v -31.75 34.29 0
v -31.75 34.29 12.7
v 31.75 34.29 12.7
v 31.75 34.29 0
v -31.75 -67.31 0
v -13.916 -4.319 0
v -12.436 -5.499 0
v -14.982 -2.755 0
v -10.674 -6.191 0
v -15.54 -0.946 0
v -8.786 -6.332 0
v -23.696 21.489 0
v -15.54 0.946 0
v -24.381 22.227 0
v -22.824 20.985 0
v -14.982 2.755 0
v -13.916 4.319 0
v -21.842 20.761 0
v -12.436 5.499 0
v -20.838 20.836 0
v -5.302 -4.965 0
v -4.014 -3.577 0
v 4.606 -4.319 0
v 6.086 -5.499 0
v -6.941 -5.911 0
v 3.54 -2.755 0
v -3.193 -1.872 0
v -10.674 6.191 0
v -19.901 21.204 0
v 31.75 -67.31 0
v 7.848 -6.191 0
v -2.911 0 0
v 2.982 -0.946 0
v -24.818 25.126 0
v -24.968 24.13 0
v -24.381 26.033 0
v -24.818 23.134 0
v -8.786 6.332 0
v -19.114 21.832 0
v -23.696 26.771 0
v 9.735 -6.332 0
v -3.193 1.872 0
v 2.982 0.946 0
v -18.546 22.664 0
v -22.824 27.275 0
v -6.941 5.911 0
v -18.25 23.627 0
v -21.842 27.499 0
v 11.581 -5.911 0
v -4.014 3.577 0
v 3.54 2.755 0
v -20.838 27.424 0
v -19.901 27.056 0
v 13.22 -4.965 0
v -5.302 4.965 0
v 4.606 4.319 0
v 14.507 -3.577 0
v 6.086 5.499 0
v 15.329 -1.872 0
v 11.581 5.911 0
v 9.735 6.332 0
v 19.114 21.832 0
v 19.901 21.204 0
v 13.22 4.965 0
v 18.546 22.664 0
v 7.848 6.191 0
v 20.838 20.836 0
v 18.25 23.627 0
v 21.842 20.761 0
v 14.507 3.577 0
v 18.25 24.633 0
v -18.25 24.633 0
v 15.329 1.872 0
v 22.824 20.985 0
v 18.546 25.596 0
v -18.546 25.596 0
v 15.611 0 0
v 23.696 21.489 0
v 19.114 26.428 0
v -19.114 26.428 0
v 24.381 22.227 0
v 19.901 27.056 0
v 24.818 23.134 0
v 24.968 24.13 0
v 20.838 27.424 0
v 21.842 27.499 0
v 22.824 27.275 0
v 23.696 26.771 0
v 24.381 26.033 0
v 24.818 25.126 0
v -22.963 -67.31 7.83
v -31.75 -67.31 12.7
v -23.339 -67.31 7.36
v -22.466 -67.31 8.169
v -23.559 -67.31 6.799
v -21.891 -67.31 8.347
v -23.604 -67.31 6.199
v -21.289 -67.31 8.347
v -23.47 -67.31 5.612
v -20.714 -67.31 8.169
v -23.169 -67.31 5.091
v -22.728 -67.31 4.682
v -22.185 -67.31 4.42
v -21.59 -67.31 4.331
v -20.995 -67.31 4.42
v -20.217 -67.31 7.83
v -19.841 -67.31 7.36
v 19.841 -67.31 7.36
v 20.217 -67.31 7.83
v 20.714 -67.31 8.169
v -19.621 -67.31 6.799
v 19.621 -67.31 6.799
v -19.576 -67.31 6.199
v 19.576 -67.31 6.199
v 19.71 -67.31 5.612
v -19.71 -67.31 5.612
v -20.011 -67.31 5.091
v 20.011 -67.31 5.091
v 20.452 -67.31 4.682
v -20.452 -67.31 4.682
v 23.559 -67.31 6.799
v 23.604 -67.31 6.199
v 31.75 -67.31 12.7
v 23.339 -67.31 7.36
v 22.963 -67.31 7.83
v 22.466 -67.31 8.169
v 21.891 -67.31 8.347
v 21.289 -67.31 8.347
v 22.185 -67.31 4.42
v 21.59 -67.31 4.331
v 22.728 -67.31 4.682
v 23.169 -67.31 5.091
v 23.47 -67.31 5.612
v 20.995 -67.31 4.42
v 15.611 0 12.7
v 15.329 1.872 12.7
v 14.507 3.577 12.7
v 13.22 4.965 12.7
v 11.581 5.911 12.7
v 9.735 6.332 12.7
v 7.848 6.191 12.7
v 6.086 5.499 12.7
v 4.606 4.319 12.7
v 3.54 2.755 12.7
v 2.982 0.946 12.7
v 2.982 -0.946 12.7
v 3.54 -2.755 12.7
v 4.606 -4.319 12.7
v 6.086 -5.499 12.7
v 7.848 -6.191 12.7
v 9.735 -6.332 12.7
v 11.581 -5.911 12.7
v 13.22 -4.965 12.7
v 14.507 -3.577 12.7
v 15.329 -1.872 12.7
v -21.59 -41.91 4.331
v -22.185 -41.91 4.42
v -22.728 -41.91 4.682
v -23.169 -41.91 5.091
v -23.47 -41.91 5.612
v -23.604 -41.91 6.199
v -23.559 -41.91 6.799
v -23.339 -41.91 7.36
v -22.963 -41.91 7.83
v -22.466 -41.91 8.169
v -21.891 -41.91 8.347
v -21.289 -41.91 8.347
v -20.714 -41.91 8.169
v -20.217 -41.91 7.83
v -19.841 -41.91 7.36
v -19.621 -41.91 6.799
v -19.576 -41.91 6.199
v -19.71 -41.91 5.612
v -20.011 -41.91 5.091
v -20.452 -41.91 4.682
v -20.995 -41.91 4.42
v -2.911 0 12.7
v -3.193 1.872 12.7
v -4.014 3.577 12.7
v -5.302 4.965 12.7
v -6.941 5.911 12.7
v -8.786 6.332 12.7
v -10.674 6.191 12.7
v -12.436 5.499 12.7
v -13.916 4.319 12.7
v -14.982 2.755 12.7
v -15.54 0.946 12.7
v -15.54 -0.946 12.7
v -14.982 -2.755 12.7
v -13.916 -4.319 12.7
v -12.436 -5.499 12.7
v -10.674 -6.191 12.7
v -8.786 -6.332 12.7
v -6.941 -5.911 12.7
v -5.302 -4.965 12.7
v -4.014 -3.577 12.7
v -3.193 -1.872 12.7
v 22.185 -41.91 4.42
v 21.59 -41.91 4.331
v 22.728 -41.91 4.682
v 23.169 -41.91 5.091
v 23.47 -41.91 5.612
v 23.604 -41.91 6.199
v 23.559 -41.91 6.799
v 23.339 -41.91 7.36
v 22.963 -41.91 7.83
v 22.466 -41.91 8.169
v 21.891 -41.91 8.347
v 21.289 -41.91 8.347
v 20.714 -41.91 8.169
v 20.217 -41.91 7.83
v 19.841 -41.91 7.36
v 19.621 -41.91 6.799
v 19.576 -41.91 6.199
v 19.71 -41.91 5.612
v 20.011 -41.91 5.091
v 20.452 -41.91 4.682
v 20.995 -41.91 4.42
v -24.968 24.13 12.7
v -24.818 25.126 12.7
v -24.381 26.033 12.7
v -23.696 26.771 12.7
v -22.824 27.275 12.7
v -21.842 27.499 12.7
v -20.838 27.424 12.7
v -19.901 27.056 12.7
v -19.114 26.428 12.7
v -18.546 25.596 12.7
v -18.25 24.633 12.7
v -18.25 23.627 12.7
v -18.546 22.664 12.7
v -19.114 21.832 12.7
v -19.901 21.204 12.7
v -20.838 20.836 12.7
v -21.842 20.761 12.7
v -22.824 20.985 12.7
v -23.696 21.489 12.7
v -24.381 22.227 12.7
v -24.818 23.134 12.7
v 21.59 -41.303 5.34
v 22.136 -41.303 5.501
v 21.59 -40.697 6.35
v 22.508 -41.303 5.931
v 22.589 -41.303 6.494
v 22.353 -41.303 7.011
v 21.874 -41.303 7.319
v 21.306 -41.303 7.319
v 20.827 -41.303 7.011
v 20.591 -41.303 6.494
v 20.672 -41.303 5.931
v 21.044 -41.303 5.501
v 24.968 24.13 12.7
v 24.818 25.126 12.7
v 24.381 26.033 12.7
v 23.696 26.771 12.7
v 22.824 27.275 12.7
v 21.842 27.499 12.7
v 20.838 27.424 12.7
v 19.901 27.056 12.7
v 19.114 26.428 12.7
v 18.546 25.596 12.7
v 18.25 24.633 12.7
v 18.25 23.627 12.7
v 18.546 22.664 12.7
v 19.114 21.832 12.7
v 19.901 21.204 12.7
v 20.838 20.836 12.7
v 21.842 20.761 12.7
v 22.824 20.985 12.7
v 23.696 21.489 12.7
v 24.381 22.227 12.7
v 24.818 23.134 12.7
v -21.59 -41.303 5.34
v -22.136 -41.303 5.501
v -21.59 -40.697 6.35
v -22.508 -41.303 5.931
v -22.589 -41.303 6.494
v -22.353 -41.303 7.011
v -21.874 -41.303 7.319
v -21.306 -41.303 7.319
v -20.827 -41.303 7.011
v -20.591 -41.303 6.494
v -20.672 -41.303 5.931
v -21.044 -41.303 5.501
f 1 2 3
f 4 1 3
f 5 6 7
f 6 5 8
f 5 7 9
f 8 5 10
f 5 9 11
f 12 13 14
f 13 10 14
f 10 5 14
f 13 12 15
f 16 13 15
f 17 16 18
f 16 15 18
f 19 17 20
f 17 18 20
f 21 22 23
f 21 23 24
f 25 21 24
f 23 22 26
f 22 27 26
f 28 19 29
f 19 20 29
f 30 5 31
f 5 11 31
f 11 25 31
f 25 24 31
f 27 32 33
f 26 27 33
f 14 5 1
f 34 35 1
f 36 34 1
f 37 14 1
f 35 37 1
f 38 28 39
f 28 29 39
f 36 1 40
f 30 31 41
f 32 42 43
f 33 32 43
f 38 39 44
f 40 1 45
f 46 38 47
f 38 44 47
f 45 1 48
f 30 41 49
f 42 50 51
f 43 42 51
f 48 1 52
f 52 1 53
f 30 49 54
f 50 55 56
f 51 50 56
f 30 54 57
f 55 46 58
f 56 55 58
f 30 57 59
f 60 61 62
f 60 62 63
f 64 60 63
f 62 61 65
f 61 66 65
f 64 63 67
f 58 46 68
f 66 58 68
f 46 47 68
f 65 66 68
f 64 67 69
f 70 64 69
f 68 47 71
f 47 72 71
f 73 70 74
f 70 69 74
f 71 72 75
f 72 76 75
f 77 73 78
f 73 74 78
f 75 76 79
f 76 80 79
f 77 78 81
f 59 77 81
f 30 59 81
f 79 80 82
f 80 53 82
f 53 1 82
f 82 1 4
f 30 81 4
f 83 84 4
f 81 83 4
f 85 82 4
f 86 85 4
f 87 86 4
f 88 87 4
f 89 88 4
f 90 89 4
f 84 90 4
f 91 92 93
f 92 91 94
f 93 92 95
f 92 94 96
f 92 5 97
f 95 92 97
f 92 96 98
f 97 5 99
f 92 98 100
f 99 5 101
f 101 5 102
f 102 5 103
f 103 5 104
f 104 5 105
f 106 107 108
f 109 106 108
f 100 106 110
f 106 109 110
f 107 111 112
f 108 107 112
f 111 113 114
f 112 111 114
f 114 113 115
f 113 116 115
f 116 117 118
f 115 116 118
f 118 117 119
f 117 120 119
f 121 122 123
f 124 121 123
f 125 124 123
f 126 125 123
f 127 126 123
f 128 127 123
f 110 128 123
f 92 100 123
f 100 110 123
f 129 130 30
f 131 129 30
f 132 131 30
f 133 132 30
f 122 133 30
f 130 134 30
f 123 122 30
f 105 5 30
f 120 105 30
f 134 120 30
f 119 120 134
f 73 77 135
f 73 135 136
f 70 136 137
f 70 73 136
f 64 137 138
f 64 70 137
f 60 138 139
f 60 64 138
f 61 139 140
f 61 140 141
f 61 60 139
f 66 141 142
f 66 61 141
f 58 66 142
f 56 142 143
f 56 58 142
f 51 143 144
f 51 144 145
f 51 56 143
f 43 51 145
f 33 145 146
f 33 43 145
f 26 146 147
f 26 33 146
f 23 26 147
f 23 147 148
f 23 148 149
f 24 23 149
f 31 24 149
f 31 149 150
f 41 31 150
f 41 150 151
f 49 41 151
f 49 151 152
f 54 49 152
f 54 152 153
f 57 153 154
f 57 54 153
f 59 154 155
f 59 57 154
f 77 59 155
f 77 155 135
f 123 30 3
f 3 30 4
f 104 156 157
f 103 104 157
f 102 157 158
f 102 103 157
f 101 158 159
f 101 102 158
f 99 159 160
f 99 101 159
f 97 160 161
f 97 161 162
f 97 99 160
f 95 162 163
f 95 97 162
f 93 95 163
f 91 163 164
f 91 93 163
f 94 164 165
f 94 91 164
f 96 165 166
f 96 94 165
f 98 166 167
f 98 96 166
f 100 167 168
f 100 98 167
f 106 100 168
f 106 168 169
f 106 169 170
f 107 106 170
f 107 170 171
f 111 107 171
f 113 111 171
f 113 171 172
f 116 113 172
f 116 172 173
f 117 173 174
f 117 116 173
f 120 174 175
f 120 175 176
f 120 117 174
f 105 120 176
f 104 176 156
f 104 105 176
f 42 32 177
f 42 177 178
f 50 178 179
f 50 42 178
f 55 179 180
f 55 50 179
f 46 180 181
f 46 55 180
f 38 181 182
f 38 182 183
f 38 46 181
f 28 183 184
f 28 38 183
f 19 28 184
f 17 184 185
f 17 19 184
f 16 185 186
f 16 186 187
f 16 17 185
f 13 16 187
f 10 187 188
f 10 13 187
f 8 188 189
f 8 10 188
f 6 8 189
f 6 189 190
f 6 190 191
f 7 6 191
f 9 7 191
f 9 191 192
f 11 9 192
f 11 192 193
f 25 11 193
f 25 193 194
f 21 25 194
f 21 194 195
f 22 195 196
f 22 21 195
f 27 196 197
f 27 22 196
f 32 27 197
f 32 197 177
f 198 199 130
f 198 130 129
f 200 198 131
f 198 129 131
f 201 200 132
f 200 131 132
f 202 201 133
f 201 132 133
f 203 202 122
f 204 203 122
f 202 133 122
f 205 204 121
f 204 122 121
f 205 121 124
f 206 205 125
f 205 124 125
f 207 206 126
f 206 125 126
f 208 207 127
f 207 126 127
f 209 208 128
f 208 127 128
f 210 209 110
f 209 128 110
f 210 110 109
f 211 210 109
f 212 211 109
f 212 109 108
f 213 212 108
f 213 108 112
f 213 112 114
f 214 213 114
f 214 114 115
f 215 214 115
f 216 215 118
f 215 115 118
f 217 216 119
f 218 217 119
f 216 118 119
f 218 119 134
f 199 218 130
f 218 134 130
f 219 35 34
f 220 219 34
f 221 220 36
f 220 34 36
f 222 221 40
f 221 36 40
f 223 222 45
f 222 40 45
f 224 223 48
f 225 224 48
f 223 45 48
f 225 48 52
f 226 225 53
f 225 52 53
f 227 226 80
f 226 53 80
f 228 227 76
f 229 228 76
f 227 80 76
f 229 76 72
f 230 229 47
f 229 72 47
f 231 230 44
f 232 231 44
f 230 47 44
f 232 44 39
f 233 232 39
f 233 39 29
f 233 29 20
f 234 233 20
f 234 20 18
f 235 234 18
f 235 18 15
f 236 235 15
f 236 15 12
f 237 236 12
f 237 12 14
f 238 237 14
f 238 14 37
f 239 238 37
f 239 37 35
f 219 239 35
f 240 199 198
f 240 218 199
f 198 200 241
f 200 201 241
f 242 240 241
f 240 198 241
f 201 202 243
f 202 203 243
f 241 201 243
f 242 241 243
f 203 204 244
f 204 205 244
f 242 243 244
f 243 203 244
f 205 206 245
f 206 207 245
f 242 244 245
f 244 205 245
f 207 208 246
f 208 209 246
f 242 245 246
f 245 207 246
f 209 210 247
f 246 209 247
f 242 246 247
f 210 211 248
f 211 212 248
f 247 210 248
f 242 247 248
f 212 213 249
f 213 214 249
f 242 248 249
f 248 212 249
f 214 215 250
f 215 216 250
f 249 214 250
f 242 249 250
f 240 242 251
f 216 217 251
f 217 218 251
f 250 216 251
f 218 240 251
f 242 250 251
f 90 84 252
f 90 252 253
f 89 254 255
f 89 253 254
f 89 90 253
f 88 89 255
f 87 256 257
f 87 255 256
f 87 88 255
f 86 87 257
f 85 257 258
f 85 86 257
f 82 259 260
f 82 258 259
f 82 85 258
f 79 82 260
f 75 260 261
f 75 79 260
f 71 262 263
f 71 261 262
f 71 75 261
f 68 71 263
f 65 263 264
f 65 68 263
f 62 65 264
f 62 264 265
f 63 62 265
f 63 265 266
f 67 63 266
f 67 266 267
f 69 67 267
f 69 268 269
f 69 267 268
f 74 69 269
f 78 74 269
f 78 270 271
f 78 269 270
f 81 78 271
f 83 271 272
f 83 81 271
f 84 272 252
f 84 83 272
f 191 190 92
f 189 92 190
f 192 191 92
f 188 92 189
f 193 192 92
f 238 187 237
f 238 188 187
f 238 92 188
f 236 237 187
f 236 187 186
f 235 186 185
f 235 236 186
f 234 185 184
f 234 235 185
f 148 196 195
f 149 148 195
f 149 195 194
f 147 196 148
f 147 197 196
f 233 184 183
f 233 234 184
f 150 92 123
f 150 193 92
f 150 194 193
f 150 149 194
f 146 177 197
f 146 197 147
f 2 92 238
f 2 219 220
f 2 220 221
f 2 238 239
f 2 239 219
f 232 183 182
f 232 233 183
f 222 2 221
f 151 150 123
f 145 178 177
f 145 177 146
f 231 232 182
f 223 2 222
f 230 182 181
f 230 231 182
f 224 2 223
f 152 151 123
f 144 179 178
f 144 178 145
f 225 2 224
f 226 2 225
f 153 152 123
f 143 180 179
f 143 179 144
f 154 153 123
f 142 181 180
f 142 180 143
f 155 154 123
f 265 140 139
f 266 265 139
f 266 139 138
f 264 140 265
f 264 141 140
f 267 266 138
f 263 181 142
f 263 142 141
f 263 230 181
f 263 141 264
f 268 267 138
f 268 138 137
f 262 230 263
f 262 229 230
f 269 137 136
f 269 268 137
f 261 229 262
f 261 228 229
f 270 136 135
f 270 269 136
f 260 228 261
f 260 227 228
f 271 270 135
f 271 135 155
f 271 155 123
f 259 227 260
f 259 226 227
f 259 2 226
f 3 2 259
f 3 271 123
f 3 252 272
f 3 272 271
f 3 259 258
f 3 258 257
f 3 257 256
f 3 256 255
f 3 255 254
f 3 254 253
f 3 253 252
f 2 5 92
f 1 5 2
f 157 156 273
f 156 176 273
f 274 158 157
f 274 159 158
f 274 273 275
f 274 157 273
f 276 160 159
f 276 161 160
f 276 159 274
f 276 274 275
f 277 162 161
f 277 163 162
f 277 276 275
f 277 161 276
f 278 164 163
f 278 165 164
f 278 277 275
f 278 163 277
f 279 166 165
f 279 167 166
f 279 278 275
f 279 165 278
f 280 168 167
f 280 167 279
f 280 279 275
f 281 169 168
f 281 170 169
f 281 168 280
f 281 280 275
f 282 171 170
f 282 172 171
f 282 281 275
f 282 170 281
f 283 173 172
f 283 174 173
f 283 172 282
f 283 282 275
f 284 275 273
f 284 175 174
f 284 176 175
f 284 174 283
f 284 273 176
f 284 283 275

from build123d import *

# Parameters (mm, degrees)
SKETCH1_W               = 63.5
SKETCH1_H               = 134.62
SKETCH1_R               = 6.35
BOSS_EXTRUDE1_DEPTH     = 12.7
SKETCH2_W               = 63.5
SKETCH2_H               = 33.02
CUT_EXTRUDE1_DEPTH      = 76.498268854
F_1_4_CLEARANCE_HOLE1_D = 6.7564


with BuildPart() as part:
    # Sketch1 → Boss-Extrude1 (new body)
    with BuildSketch(Plane.XY):
        Rectangle(SKETCH1_W, SKETCH1_H)
        with Locations((-9.26084, 0)):
            Circle(SKETCH1_R, mode=Mode.SUBTRACT)
        with Locations((9.26084, 0)):
            Circle(SKETCH1_R, mode=Mode.SUBTRACT)
    extrude(amount=BOSS_EXTRUDE1_DEPTH)

    # Sketch2 → Cut-Extrude1 (cut, through all)
    with BuildSketch(Plane.XY.offset(12.7)):
        with Locations((0, 50.8)):
            Rectangle(SKETCH2_W, SKETCH2_H)
    extrude(amount=-CUT_EXTRUDE1_DEPTH, mode=Mode.SUBTRACT)

    # 1/4 Clearance Hole1 (through all)
    with Locations(Plane.XY.offset(12.7)):
        with Locations((-21.59, 24.13)):
            f_1_4_clearance_hole1 = Hole(F_1_4_CLEARANCE_HOLE1_D / 2)

    # Mirror1: 1/4 Clearance Hole1 across plane
    add(f_1_4_clearance_hole1.mirror(Plane(origin=(0, 0, 0), x_dir=(0, 0, 1), z_dir=(1, 0, 0))), mode=Mode.SUBTRACT)

    # Sketch8 → #10-32 Tapped Hole1 (revolve, cut)
    with BuildSketch(Plane(origin=(-21.59, -67.31, 6.35), x_dir=(0, 0, -1), z_dir=(1, 0, 0))):
        Polygon((0, 0), (0, 26.613317848), (2.0193, 25.4), (2.0193, 0), align=None)
    f_10_32_tapped_hole1 = revolve(axis=Axis((-21.59, -73.66, 6.35), (0, 1, 0)), mode=Mode.SUBTRACT)

    # Mirror2: #10-32 Tapped Hole1 across plane
    add(f_10_32_tapped_hole1.mirror(Plane(origin=(0, 0, 0), x_dir=(0, 0, 1), z_dir=(1, 0, 0))), mode=Mode.SUBTRACT)


solid = part.part
